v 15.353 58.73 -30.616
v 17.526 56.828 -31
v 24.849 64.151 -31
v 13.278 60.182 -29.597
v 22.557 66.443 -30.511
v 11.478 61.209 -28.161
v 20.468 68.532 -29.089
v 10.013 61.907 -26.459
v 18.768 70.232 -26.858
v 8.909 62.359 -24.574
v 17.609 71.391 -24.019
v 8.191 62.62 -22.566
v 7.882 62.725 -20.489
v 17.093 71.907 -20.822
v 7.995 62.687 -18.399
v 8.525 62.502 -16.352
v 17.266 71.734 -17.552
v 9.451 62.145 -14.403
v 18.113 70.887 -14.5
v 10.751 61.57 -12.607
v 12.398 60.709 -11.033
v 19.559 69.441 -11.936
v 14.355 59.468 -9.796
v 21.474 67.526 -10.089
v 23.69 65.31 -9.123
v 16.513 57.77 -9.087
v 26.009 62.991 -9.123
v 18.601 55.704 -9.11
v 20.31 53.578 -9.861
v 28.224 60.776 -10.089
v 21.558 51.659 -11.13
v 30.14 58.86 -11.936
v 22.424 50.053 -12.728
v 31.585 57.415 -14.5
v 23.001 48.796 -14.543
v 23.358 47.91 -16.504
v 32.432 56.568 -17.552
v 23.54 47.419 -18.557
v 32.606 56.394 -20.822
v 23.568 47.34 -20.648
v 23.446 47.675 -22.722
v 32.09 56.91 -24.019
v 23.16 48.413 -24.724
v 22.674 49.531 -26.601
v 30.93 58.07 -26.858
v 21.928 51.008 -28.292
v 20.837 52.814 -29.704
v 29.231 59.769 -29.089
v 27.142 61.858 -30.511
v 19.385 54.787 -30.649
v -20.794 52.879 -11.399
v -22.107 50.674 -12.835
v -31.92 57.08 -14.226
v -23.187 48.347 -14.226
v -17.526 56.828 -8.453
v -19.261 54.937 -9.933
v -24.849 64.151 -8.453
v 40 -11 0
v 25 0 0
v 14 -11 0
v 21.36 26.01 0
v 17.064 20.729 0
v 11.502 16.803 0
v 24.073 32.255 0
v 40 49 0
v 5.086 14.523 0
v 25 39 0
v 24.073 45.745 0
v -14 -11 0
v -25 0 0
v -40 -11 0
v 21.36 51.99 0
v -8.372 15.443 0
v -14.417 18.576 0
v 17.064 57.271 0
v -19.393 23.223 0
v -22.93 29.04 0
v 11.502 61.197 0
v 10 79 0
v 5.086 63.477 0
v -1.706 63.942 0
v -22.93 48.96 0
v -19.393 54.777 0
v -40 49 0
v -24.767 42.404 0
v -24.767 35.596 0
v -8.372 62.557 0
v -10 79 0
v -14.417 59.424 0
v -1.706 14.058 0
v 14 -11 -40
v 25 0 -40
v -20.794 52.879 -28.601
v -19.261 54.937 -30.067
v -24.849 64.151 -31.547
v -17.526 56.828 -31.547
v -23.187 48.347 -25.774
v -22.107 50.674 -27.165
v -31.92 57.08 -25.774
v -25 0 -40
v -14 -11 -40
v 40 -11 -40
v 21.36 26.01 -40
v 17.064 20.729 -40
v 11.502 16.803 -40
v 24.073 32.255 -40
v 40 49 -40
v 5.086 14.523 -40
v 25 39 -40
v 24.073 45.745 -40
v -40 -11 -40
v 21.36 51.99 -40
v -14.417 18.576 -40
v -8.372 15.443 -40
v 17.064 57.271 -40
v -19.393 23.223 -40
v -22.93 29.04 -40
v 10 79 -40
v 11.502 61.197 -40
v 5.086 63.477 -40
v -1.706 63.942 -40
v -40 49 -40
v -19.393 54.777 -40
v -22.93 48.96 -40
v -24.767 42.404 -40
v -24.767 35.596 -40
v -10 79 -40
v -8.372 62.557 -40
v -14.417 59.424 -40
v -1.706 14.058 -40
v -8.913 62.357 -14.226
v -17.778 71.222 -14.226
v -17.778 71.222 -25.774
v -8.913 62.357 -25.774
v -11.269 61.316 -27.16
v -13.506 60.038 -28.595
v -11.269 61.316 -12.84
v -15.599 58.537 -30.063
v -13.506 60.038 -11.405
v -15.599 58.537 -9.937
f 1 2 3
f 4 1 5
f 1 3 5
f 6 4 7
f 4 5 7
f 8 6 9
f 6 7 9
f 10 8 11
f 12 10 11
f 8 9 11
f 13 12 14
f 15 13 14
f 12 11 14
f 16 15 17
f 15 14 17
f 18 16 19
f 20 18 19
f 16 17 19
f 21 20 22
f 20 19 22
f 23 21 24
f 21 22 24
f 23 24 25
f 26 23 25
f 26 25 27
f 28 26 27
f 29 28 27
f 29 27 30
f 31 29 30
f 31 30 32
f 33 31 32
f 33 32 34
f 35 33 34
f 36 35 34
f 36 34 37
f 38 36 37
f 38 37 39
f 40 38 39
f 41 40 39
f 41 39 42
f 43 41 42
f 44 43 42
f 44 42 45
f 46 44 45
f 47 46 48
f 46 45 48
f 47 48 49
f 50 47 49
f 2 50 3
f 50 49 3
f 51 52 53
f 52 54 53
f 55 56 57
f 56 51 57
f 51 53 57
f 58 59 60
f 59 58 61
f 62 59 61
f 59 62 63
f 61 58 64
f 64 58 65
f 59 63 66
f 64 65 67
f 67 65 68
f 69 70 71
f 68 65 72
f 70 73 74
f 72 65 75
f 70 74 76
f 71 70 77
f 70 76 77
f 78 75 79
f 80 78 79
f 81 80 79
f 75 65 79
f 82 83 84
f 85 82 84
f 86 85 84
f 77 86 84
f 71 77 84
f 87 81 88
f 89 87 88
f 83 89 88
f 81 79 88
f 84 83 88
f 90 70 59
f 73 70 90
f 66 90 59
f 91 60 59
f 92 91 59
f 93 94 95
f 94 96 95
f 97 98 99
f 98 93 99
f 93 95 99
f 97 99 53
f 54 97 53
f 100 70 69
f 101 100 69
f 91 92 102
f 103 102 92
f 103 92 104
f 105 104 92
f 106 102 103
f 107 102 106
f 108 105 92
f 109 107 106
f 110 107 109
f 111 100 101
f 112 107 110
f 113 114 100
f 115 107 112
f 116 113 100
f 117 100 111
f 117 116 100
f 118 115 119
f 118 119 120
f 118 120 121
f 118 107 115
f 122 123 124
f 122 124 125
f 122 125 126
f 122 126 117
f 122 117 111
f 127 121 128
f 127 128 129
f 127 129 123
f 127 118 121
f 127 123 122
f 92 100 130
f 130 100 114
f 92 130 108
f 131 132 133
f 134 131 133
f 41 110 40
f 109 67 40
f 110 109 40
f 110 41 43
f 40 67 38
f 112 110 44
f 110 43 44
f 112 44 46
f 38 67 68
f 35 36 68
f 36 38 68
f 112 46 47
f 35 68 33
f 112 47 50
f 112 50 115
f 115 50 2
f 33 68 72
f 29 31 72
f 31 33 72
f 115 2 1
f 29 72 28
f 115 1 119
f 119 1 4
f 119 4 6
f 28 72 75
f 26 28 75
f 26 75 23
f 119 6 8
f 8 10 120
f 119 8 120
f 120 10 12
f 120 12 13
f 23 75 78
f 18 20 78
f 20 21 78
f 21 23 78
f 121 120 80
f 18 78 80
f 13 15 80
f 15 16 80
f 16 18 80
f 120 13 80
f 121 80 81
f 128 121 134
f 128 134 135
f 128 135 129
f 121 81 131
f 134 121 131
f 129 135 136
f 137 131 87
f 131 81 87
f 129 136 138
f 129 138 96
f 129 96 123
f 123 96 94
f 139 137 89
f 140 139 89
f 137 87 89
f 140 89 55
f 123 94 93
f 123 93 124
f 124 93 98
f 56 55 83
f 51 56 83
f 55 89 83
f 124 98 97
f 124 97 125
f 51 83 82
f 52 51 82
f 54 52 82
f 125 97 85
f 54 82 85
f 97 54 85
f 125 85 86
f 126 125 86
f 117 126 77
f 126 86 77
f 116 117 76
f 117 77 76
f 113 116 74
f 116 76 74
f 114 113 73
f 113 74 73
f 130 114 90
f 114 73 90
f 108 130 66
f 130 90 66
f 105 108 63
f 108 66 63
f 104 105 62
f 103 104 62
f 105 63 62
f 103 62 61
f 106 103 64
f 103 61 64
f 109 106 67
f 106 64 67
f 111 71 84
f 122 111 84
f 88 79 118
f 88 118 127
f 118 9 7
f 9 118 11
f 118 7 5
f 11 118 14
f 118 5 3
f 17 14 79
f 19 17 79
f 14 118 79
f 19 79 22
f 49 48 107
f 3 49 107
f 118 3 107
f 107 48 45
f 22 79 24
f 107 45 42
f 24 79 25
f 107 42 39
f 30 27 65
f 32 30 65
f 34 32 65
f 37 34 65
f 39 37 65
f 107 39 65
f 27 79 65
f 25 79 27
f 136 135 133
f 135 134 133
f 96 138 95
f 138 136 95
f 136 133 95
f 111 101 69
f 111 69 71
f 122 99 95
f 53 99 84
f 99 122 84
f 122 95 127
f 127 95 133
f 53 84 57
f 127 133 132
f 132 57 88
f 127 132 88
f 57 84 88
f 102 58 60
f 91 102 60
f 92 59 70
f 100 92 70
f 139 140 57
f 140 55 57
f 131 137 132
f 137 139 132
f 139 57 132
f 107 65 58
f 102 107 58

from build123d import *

# Parameters (mm, degrees)
SKETCH1_R           = 25
BOSS_EXTRUDE1_DEPTH = 40
CUT_EXTRUDE1_REACH  = 100.995
SKETCH2_R           = 11
CUT_EXTRUDE3_REACH  = 100.995


with BuildPart() as part:
    # Sketch1 → Boss-Extrude1 (new body)
    with BuildSketch(Plane.XY):
        Polygon((25, 0), (-25, 0), (-14, -11), (-40, -11), (-40, 49), (-10, 79), (0, 79), (10, 79), (40, 49), (40, -11), (14, -11), align=None)
        with Locations((0, 39)):
            Circle(SKETCH1_R, mode=Mode.SUBTRACT)
    extrude(amount=-BOSS_EXTRUDE1_DEPTH)

    # Sketch2 → Cut-Extrude1 (cut, up to next)
    with BuildSketch(Plane(origin=(44.5, 44.5, 0), x_dir=(0, 0, -1), z_dir=(0.707106781, 0.707106781, 0)), mode=Mode.PRIVATE) as cut_extrude1_sk1:
        with Locations((20, 27.790367902)):
            Circle(SKETCH2_R)
    cut_extrude1_tool1 = extrude(cut_extrude1_sk1.sketch, amount=-CUT_EXTRUDE1_REACH, mode=Mode.PRIVATE) & part.part
    add(cut_extrude1_tool1.solids().sort_by_distance((24.849242, 64.150758, -20))[0], mode=Mode.SUBTRACT)

    # Sketch3 → Cut-Extrude3 (cut, up to next)
    with BuildSketch(Plane(origin=(-44.5, 44.5, 0), x_dir=(0, 0, 1), z_dir=(-0.707106781, 0.707106781, 0)), mode=Mode.PRIVATE) as cut_extrude3_sk1:
        Polygon((-8.452994616, 27.790367902), (-14.226497308, 37.790367902), (-25.773502692, 37.790367902), (-31.547005384, 27.790367902), (-25.773502692, 17.790367902), (-14.226497308, 17.790367902), align=None)
    cut_extrude3_tool1 = extrude(cut_extrude3_sk1.sketch, amount=-CUT_EXTRUDE3_REACH, mode=Mode.PRIVATE) & part.part
    add(cut_extrude3_tool1.solids().sort_by_distance((-24.849242, 64.150758, -20))[0], mode=Mode.SUBTRACT)


solid = part.part
